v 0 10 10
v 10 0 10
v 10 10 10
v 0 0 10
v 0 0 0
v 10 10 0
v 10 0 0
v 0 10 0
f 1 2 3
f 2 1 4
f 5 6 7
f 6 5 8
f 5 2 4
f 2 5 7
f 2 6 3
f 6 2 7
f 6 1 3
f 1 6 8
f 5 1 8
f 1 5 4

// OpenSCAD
// 01 Cube "Bonjour le monde".

// =========================================
// D'après le micro-tutoriel vidéo https://www.youtube.com/watch?v=xvhbrUSQRTc par Juan Gonzalez Gomez.
//==========================================

// On va faire un mini-tutoriel sur la conception de pièces en utilisant le logiciel libre OpenSCAD. 

// Votre premier code, qu'on appelle communement "Hello World" ou "Bonjour, le monde", sera la création d'un cube de côté long de 10 mm.

// Ouvrez OpenSCAD et écrivez-y :

cube([10,10,10]);

// Dans cette instruction, les nombres entre les crochets carrés représentent respectivement la longueur, la profondeur et la hauteur de notre pièce, c'est à dire la taille de la pièce le long des axes de coordonnés x,y et z.

// L'unité de mesure pour les longueurs dans OpenSCAD c'est toujours le millimètre.

// Par conséquent, l'instruction de toute à l'heure crée un cube de 10mm × 10mm × 10mm

// Une fois le cube défini, appuyez sur la touche F5 ou naviguez jusqu'a sous-menu "Compile" du menu "Design". 

// Le cube que vous venez de définir apparaît maintenant dessiné par OpenSCAD.

// Vous pouvez zoomer et dezoomer la vue en faisant tourner la mollette de la souris.

// Avec le clic gauche de la souris vous pouvez tourner la vue autour de l'origine.

// Avec le clic du milieu, vous déplacez votre point de vue ou viewport dans l'espace. 

// Lors de la conception il est souvent utile de bien reperer nos axes de coordonnées. On va donc lres afficher. Appuyez simultanémentsur les touches Ctrl et 2 ou bien cliquez sur l'option "Show Axes" du menu "View" d'OpenSCAD. 

// Vous voyez maintenant comment se positionne votre objet (le cube) par rapport aux axes X, Y et Z.

// Pour en finir avec votre code "Bonjour, le monde", écrivez un commentaire en prémière ligne de votre fichier.

//-- Cube Bonjour le monde

// Enregistrez votre fichier. Pour cela, appuyez simultanément sur les touches Ctrl et S ou bien cliquez sur l'option Save du menu "File" d'OpenScad.

// Maintenant, imaginons que vous voulez déjà imprimer la pièce que vous venez de faire dans une imprimante 3D. A fin d'exporter vers un format de fichier convenable à l'impression 3D, appuyez sur la touche F6 ou bien cliquez sur l'option "Compile and render" du menu "Design" d'OpenScad.

//Maintenant votre pièce est prête à être exportée. Pour l'exporter, allez dans l'option "Export as STL..." du menu "File" de OpenSCAD. 
